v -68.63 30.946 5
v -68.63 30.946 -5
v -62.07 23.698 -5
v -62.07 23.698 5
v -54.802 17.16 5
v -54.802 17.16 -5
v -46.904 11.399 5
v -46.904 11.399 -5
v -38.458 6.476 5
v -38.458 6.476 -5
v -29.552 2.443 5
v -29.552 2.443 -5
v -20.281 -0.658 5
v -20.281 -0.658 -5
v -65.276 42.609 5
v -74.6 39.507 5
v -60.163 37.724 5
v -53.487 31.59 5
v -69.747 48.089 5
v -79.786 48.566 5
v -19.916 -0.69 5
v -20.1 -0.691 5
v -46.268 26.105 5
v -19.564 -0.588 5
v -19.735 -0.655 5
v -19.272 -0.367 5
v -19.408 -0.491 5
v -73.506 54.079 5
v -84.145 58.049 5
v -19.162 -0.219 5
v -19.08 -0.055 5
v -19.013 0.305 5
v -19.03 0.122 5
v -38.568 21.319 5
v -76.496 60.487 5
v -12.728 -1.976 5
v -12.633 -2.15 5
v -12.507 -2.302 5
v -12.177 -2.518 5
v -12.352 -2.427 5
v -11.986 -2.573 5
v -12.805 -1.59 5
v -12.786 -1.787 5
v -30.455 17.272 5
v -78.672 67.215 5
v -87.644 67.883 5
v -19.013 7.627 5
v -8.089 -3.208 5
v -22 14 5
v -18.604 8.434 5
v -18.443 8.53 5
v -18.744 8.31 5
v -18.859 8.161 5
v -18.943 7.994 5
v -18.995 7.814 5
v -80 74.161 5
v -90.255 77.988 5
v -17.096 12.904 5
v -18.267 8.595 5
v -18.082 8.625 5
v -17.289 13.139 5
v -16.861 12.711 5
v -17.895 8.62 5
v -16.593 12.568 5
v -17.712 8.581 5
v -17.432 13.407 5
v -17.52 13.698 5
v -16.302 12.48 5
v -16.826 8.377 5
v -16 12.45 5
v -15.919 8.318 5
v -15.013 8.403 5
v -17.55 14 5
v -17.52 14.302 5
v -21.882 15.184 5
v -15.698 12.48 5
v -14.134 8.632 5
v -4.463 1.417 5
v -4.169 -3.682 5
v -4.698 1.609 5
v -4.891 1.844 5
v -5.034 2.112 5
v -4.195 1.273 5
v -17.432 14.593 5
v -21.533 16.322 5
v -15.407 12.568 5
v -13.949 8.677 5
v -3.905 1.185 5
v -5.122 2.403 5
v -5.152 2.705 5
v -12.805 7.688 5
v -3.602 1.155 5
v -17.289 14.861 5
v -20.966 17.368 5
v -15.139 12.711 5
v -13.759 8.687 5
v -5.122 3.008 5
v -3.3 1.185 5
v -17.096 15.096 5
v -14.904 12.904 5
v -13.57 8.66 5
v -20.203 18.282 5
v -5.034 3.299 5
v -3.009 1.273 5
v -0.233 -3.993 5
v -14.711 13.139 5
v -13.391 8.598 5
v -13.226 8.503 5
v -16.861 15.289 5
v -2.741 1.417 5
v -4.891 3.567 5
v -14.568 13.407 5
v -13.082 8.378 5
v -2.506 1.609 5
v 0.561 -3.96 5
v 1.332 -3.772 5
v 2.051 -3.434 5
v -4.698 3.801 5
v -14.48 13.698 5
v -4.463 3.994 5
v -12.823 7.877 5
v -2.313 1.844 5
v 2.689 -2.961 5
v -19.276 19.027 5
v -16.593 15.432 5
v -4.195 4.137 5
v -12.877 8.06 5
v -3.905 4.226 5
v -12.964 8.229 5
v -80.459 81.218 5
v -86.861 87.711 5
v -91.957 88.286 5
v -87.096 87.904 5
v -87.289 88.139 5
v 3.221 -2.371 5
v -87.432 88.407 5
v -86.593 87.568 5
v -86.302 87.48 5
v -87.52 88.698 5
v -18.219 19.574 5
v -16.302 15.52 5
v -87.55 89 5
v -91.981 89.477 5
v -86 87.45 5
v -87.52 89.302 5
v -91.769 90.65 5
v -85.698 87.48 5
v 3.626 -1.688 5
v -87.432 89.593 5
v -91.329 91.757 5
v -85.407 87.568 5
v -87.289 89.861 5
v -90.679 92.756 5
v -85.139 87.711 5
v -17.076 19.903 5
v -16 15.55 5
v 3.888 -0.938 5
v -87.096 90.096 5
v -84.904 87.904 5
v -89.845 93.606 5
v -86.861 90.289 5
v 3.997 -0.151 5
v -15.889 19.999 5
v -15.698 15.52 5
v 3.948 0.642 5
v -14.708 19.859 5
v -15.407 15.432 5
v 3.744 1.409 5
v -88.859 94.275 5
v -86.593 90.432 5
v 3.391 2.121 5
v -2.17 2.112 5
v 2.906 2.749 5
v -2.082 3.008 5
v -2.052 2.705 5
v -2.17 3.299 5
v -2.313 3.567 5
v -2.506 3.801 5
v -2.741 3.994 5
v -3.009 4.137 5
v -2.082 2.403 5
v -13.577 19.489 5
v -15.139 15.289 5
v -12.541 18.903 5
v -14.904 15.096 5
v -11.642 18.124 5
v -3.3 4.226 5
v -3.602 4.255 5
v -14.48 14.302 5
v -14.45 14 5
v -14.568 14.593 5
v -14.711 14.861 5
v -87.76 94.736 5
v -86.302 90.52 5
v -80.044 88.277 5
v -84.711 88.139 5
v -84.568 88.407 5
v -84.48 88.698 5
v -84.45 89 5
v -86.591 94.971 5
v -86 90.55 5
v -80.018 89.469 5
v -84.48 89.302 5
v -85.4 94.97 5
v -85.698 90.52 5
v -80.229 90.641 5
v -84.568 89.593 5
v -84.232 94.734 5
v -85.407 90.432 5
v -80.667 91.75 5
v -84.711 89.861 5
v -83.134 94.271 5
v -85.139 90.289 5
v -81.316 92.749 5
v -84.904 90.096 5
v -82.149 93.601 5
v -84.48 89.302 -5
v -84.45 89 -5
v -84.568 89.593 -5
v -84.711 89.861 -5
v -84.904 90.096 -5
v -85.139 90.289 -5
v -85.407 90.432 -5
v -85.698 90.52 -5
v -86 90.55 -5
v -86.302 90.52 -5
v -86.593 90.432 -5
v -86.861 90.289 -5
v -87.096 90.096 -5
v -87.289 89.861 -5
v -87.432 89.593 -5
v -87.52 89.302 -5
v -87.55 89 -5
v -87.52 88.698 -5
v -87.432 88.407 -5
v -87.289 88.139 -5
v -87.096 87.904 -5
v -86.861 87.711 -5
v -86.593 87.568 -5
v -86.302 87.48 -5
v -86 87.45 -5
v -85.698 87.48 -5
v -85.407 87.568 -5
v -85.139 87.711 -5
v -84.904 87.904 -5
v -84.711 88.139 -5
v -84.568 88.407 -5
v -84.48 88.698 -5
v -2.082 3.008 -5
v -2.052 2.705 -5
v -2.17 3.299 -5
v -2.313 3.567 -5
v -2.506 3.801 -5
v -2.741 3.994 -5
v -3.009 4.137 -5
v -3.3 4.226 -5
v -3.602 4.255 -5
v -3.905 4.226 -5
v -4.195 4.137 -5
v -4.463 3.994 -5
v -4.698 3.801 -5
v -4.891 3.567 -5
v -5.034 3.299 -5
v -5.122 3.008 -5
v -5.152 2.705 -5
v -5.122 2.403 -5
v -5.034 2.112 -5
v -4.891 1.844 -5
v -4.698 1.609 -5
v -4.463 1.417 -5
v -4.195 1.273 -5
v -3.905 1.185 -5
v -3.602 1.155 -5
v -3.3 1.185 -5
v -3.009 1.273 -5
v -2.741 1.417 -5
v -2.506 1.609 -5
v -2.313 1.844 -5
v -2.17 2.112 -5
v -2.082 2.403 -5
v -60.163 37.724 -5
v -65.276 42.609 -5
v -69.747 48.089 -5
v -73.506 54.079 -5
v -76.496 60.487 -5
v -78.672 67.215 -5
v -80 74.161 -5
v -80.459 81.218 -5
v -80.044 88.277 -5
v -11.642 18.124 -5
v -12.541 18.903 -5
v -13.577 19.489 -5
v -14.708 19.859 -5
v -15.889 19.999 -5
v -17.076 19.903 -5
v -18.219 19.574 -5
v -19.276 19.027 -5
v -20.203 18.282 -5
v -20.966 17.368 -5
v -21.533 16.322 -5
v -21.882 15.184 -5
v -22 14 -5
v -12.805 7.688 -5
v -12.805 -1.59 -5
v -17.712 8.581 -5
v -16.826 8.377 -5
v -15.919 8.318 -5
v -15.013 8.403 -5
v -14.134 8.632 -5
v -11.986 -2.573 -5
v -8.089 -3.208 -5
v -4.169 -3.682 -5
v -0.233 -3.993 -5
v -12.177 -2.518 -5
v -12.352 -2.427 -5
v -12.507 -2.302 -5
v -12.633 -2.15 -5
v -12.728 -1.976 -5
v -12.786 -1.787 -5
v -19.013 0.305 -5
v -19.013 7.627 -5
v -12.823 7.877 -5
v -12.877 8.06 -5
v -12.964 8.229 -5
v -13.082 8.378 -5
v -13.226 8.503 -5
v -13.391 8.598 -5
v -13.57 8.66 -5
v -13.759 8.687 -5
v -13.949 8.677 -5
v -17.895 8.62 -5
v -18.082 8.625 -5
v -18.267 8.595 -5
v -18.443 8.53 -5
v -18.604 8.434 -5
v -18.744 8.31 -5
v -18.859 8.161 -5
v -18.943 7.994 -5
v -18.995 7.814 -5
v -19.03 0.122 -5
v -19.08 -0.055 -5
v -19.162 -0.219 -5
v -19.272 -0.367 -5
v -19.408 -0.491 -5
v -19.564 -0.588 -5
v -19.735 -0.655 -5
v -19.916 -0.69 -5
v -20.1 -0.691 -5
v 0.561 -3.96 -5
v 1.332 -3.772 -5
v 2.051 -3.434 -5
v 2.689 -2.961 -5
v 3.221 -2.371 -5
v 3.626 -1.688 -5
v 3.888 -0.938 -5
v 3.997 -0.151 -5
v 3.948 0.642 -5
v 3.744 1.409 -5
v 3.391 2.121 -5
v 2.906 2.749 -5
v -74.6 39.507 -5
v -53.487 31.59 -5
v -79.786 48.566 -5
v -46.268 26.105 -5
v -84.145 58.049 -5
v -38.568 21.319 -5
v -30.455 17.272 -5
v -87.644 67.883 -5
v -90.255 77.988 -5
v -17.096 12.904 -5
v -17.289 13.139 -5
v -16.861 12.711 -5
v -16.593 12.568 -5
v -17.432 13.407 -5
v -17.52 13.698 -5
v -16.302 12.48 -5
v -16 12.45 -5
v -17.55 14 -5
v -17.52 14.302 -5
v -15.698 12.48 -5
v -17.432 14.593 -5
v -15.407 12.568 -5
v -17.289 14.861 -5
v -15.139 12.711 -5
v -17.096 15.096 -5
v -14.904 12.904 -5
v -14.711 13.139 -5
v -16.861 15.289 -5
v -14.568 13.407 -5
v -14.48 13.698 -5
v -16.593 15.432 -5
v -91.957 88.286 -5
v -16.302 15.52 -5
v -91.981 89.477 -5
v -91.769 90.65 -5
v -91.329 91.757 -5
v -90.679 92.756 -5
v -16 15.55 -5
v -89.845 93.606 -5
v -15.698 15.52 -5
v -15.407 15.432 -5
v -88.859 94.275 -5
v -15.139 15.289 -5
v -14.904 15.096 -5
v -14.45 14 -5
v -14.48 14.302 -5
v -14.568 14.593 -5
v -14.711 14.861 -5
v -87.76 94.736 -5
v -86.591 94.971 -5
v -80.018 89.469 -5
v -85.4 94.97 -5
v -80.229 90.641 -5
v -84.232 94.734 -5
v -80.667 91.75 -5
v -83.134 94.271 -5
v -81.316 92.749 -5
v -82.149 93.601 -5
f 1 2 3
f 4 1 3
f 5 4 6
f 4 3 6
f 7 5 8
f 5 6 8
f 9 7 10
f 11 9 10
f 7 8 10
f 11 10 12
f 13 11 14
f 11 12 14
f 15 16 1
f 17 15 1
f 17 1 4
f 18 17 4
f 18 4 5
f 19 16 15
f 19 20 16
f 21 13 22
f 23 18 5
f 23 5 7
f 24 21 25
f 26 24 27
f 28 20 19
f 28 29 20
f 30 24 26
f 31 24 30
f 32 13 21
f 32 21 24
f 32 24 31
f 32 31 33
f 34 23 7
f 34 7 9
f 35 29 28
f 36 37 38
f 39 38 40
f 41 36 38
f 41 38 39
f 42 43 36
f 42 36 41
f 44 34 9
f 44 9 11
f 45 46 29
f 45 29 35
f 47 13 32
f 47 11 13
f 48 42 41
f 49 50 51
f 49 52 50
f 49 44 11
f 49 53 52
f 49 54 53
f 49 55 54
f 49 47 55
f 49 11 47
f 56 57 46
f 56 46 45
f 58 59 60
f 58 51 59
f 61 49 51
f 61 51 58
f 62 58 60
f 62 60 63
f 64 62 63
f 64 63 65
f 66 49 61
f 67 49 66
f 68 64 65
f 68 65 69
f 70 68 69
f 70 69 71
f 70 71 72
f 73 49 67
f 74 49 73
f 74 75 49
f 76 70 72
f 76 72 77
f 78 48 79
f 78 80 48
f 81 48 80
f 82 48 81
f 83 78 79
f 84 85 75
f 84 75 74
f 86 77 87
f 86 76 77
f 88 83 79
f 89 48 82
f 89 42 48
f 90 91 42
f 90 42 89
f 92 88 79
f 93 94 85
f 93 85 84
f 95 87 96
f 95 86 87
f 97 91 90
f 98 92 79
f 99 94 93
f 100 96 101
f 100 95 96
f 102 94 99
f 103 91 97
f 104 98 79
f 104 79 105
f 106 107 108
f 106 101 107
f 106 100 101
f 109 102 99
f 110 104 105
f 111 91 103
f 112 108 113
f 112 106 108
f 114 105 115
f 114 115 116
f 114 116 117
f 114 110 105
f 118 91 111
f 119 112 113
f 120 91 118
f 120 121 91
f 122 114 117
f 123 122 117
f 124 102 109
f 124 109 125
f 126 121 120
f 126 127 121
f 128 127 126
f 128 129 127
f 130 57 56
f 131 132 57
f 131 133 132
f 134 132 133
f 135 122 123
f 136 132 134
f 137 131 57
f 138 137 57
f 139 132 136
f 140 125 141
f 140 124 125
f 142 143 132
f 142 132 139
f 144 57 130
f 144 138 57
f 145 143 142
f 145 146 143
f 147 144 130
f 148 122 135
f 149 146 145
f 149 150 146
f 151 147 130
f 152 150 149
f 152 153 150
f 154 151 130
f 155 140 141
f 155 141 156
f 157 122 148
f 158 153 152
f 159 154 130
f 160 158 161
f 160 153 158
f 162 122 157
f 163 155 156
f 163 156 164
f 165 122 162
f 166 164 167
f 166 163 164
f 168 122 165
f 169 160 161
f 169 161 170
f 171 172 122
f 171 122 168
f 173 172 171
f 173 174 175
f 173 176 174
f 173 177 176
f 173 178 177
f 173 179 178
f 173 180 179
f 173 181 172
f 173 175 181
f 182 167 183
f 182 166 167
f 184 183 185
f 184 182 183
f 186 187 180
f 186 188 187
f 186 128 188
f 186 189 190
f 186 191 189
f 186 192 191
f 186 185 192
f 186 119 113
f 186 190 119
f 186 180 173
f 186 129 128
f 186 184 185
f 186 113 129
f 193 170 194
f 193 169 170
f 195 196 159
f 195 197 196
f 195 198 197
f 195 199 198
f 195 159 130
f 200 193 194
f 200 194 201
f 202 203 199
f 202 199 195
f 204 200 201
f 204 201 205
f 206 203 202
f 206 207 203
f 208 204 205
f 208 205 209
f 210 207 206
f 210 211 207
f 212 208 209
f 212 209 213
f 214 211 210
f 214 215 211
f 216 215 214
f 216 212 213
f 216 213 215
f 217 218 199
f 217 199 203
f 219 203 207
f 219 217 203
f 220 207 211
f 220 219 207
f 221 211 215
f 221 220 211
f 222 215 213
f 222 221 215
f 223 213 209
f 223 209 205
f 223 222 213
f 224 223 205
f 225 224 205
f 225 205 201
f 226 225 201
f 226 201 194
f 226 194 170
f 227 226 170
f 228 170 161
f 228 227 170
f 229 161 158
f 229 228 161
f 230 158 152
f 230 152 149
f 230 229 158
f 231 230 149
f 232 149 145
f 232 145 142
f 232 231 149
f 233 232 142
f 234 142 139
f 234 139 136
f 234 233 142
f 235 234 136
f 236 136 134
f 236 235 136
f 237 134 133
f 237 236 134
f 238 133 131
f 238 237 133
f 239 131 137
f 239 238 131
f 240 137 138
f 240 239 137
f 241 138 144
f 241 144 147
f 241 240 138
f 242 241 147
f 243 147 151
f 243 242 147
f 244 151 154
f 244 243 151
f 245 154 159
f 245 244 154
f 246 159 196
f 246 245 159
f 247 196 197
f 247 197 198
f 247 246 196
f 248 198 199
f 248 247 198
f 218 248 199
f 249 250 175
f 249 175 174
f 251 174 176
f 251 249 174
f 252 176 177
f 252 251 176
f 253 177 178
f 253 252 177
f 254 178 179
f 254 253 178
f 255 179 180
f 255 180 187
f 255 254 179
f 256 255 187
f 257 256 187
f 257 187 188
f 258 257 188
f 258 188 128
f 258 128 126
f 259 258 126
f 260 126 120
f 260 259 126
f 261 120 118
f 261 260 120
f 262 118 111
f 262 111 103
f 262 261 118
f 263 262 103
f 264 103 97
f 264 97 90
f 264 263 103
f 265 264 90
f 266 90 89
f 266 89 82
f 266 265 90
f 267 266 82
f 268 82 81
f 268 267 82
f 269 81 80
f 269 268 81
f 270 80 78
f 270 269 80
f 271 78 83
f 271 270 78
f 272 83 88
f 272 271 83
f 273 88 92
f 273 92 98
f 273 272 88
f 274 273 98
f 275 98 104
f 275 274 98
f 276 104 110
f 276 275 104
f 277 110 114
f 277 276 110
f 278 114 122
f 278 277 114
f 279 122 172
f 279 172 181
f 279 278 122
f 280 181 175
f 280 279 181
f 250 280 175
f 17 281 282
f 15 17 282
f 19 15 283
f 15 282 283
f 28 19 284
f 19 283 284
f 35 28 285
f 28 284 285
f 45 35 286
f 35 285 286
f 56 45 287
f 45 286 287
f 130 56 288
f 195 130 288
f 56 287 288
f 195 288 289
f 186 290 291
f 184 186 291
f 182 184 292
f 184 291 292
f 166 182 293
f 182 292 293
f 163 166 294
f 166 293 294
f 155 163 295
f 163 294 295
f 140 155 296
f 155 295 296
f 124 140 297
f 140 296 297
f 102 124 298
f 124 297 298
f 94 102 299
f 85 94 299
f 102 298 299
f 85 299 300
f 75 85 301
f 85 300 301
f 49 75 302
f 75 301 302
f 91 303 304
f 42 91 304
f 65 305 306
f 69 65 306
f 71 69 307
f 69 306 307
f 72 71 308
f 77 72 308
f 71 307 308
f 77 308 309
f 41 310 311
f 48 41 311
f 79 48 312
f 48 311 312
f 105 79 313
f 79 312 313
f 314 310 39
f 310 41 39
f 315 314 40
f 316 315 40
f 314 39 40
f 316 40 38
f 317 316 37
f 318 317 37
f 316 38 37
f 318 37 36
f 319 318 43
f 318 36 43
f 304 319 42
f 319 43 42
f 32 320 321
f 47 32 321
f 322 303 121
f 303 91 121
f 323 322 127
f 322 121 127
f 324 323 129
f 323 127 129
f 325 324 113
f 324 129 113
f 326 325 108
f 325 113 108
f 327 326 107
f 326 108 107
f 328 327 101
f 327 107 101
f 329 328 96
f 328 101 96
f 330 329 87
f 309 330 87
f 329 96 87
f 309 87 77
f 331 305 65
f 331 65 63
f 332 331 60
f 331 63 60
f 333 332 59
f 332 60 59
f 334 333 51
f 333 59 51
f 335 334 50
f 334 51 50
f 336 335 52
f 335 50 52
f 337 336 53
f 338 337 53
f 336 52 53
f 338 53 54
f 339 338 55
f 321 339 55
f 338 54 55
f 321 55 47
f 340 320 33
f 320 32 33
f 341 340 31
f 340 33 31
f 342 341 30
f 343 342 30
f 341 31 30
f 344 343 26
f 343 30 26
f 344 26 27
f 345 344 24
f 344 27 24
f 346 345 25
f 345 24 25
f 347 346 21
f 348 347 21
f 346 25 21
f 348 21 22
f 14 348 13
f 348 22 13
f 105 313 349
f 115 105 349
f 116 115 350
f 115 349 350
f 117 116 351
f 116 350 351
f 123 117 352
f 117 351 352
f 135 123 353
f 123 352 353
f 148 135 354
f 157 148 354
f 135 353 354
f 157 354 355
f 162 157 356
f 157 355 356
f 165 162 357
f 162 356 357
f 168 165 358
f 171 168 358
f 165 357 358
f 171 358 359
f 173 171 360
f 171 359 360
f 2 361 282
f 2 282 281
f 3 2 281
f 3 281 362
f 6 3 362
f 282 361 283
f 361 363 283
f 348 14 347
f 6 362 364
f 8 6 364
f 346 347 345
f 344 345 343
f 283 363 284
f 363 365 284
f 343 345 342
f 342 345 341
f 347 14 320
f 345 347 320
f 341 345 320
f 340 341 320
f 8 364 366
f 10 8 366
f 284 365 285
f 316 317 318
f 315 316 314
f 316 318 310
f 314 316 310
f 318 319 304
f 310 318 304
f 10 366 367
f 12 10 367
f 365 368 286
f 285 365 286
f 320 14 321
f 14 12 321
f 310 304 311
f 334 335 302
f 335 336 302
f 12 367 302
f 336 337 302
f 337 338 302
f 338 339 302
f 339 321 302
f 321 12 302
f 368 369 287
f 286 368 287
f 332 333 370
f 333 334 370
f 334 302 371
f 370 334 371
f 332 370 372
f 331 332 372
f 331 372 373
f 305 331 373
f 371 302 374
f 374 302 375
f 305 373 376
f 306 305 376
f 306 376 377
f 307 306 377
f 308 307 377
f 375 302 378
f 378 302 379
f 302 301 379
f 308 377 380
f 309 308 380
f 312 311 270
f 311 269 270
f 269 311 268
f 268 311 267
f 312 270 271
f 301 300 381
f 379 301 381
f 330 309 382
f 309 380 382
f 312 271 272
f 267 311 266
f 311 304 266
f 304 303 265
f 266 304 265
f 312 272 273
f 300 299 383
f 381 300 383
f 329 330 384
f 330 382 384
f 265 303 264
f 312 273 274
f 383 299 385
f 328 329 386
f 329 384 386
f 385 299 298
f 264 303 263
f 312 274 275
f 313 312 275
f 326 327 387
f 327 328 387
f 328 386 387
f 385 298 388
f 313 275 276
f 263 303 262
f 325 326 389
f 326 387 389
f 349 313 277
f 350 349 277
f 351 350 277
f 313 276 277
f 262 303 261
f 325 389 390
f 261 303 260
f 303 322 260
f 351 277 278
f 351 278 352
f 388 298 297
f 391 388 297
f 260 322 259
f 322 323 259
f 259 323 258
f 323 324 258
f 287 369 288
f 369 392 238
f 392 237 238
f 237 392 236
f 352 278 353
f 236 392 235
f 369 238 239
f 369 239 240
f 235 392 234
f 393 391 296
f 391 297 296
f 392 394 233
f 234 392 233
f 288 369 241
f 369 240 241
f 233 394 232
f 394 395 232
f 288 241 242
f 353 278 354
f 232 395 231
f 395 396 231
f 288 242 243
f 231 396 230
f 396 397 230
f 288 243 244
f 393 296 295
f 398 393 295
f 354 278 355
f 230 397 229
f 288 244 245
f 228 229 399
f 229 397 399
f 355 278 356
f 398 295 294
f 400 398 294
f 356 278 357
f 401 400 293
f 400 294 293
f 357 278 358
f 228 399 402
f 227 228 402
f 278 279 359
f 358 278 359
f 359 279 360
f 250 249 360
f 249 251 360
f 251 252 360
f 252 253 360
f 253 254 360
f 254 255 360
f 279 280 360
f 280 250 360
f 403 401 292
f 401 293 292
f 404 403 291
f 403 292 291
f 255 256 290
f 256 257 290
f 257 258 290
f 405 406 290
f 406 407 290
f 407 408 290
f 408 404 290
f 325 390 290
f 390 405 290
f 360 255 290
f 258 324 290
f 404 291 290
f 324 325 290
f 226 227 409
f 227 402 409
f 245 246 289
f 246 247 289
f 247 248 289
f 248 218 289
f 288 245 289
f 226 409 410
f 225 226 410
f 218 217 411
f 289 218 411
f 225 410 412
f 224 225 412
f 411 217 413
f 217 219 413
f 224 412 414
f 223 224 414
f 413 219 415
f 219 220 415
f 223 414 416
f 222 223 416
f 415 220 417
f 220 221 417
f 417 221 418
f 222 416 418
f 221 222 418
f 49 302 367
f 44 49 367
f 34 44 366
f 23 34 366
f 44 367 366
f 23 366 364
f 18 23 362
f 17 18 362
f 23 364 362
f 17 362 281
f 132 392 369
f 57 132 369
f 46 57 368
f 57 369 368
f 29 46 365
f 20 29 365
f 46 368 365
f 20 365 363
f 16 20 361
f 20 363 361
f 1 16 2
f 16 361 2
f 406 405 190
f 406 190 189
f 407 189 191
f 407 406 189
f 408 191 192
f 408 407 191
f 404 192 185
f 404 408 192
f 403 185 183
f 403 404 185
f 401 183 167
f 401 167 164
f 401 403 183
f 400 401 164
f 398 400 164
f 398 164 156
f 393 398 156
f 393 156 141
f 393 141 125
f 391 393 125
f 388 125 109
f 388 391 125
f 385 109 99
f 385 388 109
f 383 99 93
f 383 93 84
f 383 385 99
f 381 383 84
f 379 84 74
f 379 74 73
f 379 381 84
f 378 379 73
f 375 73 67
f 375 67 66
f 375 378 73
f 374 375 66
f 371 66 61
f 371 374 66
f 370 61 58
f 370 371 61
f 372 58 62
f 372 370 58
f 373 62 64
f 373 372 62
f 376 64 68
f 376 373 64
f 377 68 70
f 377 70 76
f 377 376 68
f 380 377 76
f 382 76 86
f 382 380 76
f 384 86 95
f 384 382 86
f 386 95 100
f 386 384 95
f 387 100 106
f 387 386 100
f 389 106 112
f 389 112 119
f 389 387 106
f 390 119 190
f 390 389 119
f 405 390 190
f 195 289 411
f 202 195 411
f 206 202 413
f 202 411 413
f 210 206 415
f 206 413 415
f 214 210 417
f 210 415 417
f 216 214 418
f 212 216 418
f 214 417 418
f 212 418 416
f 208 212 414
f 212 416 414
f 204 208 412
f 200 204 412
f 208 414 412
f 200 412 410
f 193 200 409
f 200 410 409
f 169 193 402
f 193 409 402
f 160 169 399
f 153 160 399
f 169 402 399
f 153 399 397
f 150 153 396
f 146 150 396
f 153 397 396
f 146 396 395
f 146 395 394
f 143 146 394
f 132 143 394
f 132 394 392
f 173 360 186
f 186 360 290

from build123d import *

# Parameters (mm, degrees)
BOSS_EXTRUDE1_DEPTH      = 5
BOSS_EXTRUDE1_DEPTH_BACK = 5
SKETCH2_R                = 1.55
CUT_EXTRUDE1_START       = -10
CUT_EXTRUDE1_DEPTH       = 10
FILLET1_R                = 1


with BuildPart() as part:
    # Sketch2 → Boss-Extrude1 (new, two sides: drawn at the far end of the back side and taken through both)
    with BuildSketch(Plane.XY.offset(-BOSS_EXTRUDE1_DEPTH_BACK)):
        with BuildLine():
            Line((2.905523423, 2.749169627), (-11.641714865, 18.12375444))
            ThreePointArc((-11.641714865, 18.12375444), (-18.21926668, 19.574482524), (-22, 14))
            ThreePointArc((-22, 14), (-42.474078457, 23.622085), (-60.163399658, 37.723869421))
            ThreePointArc((-60.163399658, 37.723869421), (-76.495910352, 60.486816081), (-80.043672644, 88.277390543))
            ThreePointArc((-80.043672644, 88.277390543), (-85.99568578, 94.999998449), (-91.957360362, 88.285956923))
            ThreePointArc((-91.957360362, 88.285956923), (-84.145355247, 58.049091263), (-68.630234445, 30.946019566))
            ThreePointArc((-68.630234445, 30.946019566), (-38.101001964, 6.292742427), (-0.232587209, -3.993232173))
            ThreePointArc((-0.232587209, -3.993232173), (3.626450401, -1.687855885), (2.905523423, 2.749169627))
        make_face()
        with Locations((-86, 89)):
            Circle(SKETCH2_R, mode=Mode.SUBTRACT)
        with Locations((-16, 14)):
            Circle(SKETCH2_R, mode=Mode.SUBTRACT)
        with Locations((-3.6022, 2.7054)):
            Circle(SKETCH2_R, mode=Mode.SUBTRACT)
    extrude(amount=BOSS_EXTRUDE1_DEPTH + BOSS_EXTRUDE1_DEPTH_BACK)

    # Sketch3 → Cut-Extrude1 (cut)
    with BuildSketch(Plane.XY.offset(5).offset(CUT_EXTRUDE1_START)):
        with BuildLine():
            Line((-19.012966708, -1.001561409), (-19.012966708, 9.18151319))
            ThreePointArc((-19.012966708, 9.18151319), (-15.891446961, 8.318098931), (-12.805184231, 9.300113222))
            Line((-12.805184231, 9.300113222), (-12.805184231, -2.418437298))
            ThreePointArc((-12.805184231, -2.418437298), (-15.920894449, -1.76178205), (-19.012966708, -1.001561409))
        make_face()
    extrude(amount=CUT_EXTRUDE1_DEPTH, mode=Mode.SUBTRACT)

    # Fillet1
    fillet1_edges = [part.edges().sort_by_distance(p)[0] for p in [
        (-12.805184231, -2.418437298, 0),
        (-19.012966708, -1.001561409, 0),
        (-19.012966708, 9.18151319, 0),
        (-12.805184231, 9.300113222, 0),
    ]]
    fillet(fillet1_edges, radius=FILLET1_R)


solid = part.part
